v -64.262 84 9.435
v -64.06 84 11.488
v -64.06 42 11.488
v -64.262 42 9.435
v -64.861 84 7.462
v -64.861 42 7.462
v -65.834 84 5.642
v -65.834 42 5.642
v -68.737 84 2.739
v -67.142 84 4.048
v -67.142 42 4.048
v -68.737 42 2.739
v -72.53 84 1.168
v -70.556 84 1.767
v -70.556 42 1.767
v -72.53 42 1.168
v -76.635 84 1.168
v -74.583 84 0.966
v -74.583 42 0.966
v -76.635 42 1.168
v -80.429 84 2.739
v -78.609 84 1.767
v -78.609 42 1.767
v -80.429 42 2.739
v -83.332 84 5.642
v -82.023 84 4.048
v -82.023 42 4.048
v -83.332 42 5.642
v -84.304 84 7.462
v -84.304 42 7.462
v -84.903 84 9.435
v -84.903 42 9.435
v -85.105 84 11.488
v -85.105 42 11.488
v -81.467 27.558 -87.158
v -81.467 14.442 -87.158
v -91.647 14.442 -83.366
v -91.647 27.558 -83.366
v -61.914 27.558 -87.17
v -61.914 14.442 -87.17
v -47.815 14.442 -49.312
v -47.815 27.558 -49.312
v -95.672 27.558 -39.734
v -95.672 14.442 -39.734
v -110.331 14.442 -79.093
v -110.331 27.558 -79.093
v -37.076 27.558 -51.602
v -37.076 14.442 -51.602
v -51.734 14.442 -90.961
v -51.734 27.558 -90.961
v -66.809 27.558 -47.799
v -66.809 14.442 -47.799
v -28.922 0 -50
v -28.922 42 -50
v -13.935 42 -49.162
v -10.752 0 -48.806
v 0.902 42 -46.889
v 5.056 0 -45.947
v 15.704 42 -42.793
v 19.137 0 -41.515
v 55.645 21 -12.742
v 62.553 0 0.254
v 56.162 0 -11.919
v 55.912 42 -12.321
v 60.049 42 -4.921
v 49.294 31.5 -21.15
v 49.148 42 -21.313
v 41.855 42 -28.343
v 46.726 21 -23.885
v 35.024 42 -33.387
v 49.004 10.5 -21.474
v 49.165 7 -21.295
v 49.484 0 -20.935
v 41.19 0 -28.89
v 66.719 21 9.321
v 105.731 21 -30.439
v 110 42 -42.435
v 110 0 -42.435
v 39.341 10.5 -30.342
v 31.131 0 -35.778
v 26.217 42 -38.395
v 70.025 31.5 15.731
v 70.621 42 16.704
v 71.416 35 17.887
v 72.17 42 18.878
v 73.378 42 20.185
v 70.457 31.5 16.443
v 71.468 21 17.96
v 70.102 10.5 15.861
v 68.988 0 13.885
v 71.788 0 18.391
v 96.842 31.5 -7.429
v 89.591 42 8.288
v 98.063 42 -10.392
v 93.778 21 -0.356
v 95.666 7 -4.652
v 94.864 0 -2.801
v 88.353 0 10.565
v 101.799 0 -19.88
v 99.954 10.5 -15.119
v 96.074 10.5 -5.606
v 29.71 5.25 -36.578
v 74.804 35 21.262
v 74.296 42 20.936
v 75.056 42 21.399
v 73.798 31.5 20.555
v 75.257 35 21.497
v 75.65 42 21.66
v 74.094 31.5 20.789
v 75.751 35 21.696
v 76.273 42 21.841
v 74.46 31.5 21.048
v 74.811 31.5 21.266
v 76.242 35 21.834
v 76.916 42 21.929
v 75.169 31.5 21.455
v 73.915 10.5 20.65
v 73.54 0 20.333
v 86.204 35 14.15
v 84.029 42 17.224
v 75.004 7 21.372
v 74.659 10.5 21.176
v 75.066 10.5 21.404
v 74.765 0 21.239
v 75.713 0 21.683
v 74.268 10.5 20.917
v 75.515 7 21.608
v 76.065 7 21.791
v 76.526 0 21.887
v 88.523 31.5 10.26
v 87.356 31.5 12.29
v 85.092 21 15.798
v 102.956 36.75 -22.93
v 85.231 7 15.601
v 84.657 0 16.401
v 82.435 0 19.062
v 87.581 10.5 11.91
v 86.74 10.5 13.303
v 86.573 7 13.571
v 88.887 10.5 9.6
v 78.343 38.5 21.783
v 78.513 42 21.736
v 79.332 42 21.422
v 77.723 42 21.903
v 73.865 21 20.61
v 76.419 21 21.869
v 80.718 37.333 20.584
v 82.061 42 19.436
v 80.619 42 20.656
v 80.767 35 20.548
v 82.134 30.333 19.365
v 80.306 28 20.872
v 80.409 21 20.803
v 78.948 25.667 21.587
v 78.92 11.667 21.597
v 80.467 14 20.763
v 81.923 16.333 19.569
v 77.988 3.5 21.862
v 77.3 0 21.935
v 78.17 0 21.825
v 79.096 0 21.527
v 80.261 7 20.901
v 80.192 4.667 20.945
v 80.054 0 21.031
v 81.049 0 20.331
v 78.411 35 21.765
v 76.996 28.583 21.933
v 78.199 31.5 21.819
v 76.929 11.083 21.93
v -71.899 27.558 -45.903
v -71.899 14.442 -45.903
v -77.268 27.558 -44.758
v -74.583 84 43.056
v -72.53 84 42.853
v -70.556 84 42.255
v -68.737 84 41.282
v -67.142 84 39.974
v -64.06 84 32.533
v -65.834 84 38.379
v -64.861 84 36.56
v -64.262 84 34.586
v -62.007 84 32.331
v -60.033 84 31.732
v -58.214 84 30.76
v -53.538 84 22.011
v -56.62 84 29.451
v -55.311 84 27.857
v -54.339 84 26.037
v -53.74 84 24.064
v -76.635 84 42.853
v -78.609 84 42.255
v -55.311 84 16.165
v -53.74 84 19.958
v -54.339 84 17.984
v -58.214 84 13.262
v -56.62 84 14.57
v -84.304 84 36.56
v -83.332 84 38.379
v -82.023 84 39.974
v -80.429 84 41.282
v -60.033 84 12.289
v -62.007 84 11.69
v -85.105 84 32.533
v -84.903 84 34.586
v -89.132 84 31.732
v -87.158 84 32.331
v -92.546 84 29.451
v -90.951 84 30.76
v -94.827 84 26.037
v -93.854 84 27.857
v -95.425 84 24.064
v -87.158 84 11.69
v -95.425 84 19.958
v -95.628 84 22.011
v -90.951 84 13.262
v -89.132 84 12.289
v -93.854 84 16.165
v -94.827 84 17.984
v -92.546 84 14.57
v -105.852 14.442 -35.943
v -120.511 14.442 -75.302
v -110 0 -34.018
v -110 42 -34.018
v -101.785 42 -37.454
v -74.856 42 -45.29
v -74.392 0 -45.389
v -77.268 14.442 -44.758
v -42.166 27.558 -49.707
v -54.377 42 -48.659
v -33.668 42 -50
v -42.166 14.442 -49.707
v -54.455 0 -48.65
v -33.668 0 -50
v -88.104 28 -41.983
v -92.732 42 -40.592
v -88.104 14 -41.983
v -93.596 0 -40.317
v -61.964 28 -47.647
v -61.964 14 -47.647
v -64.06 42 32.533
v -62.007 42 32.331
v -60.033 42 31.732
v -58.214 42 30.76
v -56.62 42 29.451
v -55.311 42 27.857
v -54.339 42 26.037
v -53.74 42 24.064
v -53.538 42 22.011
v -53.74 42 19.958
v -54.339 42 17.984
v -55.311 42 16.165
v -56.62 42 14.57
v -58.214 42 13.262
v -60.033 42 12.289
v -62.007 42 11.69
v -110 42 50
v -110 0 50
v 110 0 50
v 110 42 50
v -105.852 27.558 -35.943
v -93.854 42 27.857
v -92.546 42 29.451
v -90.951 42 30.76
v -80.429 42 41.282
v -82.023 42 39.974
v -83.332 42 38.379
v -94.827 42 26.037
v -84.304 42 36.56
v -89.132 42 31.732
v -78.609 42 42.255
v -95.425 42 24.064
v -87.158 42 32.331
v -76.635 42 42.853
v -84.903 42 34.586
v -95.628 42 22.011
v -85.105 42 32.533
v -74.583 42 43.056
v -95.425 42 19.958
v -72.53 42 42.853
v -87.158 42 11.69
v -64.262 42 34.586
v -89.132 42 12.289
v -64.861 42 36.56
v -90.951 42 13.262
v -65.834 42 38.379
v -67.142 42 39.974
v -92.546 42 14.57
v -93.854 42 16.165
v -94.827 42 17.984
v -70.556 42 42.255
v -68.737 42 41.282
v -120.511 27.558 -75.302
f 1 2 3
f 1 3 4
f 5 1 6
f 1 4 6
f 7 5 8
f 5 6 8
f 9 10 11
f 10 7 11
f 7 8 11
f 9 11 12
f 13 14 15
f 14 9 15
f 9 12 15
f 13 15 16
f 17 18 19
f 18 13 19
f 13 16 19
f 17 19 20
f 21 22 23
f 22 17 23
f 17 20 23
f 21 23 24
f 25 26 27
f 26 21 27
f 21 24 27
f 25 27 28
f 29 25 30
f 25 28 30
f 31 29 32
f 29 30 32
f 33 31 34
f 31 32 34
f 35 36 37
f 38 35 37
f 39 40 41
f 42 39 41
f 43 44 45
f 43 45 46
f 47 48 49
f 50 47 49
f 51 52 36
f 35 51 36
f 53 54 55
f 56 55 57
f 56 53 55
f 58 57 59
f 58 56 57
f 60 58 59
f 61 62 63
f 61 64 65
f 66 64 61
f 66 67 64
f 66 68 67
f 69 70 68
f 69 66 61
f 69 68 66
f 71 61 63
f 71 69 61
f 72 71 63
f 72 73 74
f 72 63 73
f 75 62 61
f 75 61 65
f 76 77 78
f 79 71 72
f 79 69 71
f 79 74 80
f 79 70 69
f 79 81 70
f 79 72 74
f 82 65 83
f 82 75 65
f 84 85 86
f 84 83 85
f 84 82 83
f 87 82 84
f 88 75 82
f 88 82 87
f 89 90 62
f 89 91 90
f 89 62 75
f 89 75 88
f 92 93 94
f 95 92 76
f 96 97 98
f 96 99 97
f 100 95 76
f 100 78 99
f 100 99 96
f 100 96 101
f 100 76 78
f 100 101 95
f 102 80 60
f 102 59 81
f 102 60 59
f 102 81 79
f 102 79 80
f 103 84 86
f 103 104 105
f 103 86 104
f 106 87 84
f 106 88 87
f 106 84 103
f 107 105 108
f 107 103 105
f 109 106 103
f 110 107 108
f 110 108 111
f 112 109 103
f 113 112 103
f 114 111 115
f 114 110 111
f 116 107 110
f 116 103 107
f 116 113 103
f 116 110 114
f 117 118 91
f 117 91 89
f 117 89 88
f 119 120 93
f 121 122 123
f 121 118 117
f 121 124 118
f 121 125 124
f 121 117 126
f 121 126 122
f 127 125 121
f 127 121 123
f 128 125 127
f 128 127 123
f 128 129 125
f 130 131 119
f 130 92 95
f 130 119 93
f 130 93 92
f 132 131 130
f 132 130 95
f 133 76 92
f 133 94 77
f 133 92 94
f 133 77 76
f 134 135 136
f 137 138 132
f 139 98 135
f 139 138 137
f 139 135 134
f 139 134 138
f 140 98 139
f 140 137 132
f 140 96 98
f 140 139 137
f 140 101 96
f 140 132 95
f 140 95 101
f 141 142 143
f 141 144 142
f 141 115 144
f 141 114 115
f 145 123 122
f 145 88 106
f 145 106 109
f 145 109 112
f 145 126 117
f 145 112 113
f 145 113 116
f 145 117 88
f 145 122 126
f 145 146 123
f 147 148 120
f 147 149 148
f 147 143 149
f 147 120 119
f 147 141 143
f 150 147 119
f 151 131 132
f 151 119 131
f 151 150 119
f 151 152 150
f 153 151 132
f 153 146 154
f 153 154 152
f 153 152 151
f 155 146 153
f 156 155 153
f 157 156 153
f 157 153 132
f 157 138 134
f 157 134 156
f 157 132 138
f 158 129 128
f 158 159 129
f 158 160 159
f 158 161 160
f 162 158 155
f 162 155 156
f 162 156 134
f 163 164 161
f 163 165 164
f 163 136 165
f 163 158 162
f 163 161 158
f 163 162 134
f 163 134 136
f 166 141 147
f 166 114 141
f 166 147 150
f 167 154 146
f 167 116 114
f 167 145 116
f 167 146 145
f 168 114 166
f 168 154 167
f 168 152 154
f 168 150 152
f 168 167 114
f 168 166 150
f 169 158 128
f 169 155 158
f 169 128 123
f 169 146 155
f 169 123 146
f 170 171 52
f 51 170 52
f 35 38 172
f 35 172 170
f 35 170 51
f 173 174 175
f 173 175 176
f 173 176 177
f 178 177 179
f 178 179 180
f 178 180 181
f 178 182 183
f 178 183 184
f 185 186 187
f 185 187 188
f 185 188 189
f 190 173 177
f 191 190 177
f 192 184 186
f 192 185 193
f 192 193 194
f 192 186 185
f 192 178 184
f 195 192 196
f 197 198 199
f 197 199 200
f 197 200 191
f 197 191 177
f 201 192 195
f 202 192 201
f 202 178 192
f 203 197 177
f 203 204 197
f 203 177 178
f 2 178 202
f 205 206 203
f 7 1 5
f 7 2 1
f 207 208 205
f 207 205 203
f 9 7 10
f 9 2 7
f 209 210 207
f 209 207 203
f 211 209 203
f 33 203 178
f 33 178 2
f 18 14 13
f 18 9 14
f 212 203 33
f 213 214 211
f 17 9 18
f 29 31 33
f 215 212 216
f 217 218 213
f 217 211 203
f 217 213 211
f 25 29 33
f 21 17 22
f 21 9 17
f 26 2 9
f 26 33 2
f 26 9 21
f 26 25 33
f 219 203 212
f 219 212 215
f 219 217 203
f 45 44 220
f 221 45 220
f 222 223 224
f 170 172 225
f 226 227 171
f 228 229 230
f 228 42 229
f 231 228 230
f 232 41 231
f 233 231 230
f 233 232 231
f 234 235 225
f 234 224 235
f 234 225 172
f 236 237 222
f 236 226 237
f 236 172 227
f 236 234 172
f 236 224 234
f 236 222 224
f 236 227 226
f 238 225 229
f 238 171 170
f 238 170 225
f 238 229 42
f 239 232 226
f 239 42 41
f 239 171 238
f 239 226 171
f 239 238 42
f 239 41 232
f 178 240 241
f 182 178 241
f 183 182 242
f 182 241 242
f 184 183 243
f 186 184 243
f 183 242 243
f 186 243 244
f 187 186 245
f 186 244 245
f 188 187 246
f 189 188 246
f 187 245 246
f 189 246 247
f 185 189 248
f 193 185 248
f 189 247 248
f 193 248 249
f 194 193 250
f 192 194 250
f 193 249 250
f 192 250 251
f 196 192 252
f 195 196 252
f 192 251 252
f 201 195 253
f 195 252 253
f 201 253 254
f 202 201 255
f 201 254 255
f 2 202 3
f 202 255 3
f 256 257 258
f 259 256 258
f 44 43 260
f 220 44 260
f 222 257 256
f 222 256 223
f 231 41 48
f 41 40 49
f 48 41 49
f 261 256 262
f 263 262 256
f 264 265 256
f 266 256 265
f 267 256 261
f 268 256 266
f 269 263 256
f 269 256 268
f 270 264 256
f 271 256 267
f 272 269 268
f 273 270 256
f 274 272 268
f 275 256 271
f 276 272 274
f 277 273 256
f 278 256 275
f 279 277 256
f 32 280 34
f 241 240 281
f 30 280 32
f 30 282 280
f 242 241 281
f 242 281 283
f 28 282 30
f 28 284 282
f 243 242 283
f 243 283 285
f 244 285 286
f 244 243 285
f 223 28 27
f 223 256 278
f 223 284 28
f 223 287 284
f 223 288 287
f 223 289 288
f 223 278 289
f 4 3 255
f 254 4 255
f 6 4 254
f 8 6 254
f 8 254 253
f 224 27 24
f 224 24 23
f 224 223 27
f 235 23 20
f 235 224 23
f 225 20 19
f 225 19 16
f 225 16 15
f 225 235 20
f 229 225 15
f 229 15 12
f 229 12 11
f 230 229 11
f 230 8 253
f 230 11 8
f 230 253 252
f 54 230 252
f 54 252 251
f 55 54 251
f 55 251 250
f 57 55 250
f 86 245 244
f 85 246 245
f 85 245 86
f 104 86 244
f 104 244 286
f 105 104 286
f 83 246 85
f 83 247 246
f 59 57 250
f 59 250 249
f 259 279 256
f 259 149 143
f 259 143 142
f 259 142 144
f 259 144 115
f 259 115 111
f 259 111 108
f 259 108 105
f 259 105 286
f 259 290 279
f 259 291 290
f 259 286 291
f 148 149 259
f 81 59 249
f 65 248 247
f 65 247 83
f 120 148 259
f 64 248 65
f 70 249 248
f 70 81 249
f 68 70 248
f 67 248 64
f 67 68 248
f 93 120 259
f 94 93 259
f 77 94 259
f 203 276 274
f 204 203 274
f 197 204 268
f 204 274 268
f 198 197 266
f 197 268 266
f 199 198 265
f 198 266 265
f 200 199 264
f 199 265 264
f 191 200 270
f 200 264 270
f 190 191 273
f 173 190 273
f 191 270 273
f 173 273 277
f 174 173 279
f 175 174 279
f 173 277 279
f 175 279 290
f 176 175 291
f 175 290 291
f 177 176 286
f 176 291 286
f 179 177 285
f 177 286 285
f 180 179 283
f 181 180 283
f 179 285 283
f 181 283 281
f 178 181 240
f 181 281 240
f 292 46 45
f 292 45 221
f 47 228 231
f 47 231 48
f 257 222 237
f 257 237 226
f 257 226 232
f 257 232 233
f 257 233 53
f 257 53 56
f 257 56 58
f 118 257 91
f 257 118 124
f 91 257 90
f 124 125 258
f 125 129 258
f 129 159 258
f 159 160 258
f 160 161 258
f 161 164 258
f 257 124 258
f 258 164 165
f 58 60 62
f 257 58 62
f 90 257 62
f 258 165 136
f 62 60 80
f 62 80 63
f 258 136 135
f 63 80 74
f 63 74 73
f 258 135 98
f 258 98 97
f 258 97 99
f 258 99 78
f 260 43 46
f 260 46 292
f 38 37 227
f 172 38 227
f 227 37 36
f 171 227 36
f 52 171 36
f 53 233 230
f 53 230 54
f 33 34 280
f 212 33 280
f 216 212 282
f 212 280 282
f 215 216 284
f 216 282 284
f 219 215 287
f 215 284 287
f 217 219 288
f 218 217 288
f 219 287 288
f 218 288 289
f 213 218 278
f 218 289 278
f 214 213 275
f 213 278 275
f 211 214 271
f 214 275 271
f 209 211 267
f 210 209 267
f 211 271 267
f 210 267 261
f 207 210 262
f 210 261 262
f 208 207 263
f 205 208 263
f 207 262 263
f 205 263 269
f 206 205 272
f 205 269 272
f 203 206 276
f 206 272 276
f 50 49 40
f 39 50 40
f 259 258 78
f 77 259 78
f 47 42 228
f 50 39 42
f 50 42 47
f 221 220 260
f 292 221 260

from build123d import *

# Parameters (mm, degrees)
SKETCH1_W               = 220
SKETCH1_H               = 100
BOSS_EXTRUDE1_DEPTH     = 42
CUT_EXTRUDE1_DEPTH      = 128.921851144
CUT_EXTRUDE1_DEPTH_BACK = 42
SKETCH4_W               = 10.863046684
SKETCH4_H               = 13.116347432
BOSS_EXTRUDE2_DEPTH     = 42
CRVPATTERN4_START       = 14.441826284
CRVPATTERN4_DEPTH       = 13.116347432
SKETCH5_R               = 10.522438617
BOSS_EXTRUDE3_DEPTH     = 42
CRVPATTERN5_START       = 42
CRVPATTERN5_DEPTH       = 42


# Read off the part's stored shape, not the designer's step: CrvPattern4, CrvPattern5
with BuildPart() as part:
    # Sketch1 → Boss-Extrude1 (new body)
    with BuildSketch(Plane(origin=(0, 0, 0), x_dir=(1, 0, 0), z_dir=(0, 1, 0))):
        Rectangle(SKETCH1_W, SKETCH1_H)
    extrude(amount=BOSS_EXTRUDE1_DEPTH)

    # Sketch2 → Cut-Extrude1 (cut, two sides: drawn at the far end of the back side and taken through both)
    with BuildSketch(Plane(origin=(0, 42, 0), x_dir=(1, 0, 0), z_dir=(0, 1, 0)).offset(-CUT_EXTRUDE1_DEPTH_BACK)):
        with BuildLine():
            Line((-110, 50), (-110, 34.018302373))
            add(Edge.make_bspline(
                [(-110, 34.018302373), (-90.921302279, 42.796993449), (-62.347364364, 49.638009449), (-33.667598225, 50)],
                knots=[0, 0, 0, 0, 0.288325929, 0.288325929, 0.288325929, 0.288325929], degree=3))
            Line((-33.667598225, 50), (-110, 50))
        make_face()
        with BuildLine():
            Line((110, 50), (-28.922259265, 50))
            add(Edge.make_bspline(
                [(-28.922259265, 50), (5.063593541, 49.565322922), (73.051912414, 29.42561028), (73.809802477, -61.258173527), (110, 42.435201929)],
                knots=[0.304230058, 0.304230058, 0.304230058, 0.304230058, 0.646100978, 1, 1, 1, 1], degree=3))
            Line((110, 42.435201929), (110, 50))
        make_face()
    extrude(amount=CUT_EXTRUDE1_DEPTH + CUT_EXTRUDE1_DEPTH_BACK, mode=Mode.SUBTRACT)

    # CrvPattern4 outline → CrvPattern4 (add)
    with BuildSketch(Plane(origin=(0, 0, 0), x_dir=(1, 0, 0), z_dir=(0, 1, 0)).offset(CRVPATTERN4_START)):
        with BuildLine():
            Line((-61.914207467, 87.170095465), (-47.814600775, 49.311928392))
            add(Edge.make_bspline(
                [(-47.814600775, 49.311928392), (-45.937957006, 49.469032429), (-44.054080269, 49.601099301), (-42.165682791, 49.706817193)],
                knots=[0.240747613, 0.240747613, 0.240747613, 0.240747613, 0.259807176, 0.259807176, 0.259807176, 0.259807176], degree=3))
            Line((-42.165682791, 49.706817193), (-37.07570519, 51.602489588))
            Line((-37.07570519, 51.602489588), (-51.734252265, 90.961440256))
            Line((-51.734252265, 90.961440256), (-61.914207467, 87.170095465))
        make_face()
        with BuildLine():
            Line((-66.80866968, 47.79871448), (-81.467216756, 87.157665147))
            Line((-81.467216756, 87.157665147), (-91.647171958, 83.366320357))
            Line((-91.647171958, 83.366320357), (-77.268122044, 44.7578339))
            add(Edge.make_bspline(
                [(-77.268122044, 44.7578339), (-75.500522799, 45.159009867), (-73.709714059, 45.54122177), (-71.898647282, 45.903042085)],
                knots=[0.137413099, 0.137413099, 0.137413099, 0.137413099, 0.157017326, 0.157017326, 0.157017326, 0.157017326], degree=3))
            Line((-71.898647282, 45.903042085), (-66.80866968, 47.79871448))
        make_face()
    extrude(amount=CRVPATTERN4_DEPTH)

    # Sketch5 → Boss-Extrude3 (add)
    with BuildSketch(Plane(origin=(0, 42, 0), x_dir=(1, 0, 0), z_dir=(0, 1, 0))):
        with Locations(Location((-74.582648438, -11.488268504, 0), (0, 0, 90))):
            Circle(SKETCH5_R)
    extrude(amount=BOSS_EXTRUDE3_DEPTH)

    # CrvPattern5 outline → CrvPattern5 (add)
    with BuildSketch(Plane(origin=(0, 0, 0), x_dir=(1, 0, 0), z_dir=(0, 1, 0)).offset(CRVPATTERN5_START)):
        with BuildLine():
            ThreePointArc((-85.105087055, -11.488268504), (-95.627525672, -22.010707121), (-85.105087055, -32.533145738))
            ThreePointArc((-85.105087055, -32.533145738), (-74.582648438, -43.055584355), (-64.060209821, -32.533145738))
            ThreePointArc((-64.060209821, -32.533145738), (-53.537771204, -22.010707121), (-64.060209821, -11.488268504))
            ThreePointArc((-64.060209821, -11.488268504), (-74.582648438, -22.010707121), (-85.105087055, -11.488268504))
        make_face()
    extrude(amount=CRVPATTERN5_DEPTH)


with BuildPart() as body_2:
    # Sketch4 → Boss-Extrude2 (new body)
    with BuildSketch(Plane(origin=(-100.762158874, 21, -37.838685151), x_dir=(-0.9371178730352806, 0, 0.3490130255990909), z_dir=(-0.3490130255990909, 0, -0.9371178730352806))):
        Rectangle(SKETCH4_W, SKETCH4_H)
    extrude(amount=BOSS_EXTRUDE2_DEPTH)


solid = Compound([part.part, body_2.part])
